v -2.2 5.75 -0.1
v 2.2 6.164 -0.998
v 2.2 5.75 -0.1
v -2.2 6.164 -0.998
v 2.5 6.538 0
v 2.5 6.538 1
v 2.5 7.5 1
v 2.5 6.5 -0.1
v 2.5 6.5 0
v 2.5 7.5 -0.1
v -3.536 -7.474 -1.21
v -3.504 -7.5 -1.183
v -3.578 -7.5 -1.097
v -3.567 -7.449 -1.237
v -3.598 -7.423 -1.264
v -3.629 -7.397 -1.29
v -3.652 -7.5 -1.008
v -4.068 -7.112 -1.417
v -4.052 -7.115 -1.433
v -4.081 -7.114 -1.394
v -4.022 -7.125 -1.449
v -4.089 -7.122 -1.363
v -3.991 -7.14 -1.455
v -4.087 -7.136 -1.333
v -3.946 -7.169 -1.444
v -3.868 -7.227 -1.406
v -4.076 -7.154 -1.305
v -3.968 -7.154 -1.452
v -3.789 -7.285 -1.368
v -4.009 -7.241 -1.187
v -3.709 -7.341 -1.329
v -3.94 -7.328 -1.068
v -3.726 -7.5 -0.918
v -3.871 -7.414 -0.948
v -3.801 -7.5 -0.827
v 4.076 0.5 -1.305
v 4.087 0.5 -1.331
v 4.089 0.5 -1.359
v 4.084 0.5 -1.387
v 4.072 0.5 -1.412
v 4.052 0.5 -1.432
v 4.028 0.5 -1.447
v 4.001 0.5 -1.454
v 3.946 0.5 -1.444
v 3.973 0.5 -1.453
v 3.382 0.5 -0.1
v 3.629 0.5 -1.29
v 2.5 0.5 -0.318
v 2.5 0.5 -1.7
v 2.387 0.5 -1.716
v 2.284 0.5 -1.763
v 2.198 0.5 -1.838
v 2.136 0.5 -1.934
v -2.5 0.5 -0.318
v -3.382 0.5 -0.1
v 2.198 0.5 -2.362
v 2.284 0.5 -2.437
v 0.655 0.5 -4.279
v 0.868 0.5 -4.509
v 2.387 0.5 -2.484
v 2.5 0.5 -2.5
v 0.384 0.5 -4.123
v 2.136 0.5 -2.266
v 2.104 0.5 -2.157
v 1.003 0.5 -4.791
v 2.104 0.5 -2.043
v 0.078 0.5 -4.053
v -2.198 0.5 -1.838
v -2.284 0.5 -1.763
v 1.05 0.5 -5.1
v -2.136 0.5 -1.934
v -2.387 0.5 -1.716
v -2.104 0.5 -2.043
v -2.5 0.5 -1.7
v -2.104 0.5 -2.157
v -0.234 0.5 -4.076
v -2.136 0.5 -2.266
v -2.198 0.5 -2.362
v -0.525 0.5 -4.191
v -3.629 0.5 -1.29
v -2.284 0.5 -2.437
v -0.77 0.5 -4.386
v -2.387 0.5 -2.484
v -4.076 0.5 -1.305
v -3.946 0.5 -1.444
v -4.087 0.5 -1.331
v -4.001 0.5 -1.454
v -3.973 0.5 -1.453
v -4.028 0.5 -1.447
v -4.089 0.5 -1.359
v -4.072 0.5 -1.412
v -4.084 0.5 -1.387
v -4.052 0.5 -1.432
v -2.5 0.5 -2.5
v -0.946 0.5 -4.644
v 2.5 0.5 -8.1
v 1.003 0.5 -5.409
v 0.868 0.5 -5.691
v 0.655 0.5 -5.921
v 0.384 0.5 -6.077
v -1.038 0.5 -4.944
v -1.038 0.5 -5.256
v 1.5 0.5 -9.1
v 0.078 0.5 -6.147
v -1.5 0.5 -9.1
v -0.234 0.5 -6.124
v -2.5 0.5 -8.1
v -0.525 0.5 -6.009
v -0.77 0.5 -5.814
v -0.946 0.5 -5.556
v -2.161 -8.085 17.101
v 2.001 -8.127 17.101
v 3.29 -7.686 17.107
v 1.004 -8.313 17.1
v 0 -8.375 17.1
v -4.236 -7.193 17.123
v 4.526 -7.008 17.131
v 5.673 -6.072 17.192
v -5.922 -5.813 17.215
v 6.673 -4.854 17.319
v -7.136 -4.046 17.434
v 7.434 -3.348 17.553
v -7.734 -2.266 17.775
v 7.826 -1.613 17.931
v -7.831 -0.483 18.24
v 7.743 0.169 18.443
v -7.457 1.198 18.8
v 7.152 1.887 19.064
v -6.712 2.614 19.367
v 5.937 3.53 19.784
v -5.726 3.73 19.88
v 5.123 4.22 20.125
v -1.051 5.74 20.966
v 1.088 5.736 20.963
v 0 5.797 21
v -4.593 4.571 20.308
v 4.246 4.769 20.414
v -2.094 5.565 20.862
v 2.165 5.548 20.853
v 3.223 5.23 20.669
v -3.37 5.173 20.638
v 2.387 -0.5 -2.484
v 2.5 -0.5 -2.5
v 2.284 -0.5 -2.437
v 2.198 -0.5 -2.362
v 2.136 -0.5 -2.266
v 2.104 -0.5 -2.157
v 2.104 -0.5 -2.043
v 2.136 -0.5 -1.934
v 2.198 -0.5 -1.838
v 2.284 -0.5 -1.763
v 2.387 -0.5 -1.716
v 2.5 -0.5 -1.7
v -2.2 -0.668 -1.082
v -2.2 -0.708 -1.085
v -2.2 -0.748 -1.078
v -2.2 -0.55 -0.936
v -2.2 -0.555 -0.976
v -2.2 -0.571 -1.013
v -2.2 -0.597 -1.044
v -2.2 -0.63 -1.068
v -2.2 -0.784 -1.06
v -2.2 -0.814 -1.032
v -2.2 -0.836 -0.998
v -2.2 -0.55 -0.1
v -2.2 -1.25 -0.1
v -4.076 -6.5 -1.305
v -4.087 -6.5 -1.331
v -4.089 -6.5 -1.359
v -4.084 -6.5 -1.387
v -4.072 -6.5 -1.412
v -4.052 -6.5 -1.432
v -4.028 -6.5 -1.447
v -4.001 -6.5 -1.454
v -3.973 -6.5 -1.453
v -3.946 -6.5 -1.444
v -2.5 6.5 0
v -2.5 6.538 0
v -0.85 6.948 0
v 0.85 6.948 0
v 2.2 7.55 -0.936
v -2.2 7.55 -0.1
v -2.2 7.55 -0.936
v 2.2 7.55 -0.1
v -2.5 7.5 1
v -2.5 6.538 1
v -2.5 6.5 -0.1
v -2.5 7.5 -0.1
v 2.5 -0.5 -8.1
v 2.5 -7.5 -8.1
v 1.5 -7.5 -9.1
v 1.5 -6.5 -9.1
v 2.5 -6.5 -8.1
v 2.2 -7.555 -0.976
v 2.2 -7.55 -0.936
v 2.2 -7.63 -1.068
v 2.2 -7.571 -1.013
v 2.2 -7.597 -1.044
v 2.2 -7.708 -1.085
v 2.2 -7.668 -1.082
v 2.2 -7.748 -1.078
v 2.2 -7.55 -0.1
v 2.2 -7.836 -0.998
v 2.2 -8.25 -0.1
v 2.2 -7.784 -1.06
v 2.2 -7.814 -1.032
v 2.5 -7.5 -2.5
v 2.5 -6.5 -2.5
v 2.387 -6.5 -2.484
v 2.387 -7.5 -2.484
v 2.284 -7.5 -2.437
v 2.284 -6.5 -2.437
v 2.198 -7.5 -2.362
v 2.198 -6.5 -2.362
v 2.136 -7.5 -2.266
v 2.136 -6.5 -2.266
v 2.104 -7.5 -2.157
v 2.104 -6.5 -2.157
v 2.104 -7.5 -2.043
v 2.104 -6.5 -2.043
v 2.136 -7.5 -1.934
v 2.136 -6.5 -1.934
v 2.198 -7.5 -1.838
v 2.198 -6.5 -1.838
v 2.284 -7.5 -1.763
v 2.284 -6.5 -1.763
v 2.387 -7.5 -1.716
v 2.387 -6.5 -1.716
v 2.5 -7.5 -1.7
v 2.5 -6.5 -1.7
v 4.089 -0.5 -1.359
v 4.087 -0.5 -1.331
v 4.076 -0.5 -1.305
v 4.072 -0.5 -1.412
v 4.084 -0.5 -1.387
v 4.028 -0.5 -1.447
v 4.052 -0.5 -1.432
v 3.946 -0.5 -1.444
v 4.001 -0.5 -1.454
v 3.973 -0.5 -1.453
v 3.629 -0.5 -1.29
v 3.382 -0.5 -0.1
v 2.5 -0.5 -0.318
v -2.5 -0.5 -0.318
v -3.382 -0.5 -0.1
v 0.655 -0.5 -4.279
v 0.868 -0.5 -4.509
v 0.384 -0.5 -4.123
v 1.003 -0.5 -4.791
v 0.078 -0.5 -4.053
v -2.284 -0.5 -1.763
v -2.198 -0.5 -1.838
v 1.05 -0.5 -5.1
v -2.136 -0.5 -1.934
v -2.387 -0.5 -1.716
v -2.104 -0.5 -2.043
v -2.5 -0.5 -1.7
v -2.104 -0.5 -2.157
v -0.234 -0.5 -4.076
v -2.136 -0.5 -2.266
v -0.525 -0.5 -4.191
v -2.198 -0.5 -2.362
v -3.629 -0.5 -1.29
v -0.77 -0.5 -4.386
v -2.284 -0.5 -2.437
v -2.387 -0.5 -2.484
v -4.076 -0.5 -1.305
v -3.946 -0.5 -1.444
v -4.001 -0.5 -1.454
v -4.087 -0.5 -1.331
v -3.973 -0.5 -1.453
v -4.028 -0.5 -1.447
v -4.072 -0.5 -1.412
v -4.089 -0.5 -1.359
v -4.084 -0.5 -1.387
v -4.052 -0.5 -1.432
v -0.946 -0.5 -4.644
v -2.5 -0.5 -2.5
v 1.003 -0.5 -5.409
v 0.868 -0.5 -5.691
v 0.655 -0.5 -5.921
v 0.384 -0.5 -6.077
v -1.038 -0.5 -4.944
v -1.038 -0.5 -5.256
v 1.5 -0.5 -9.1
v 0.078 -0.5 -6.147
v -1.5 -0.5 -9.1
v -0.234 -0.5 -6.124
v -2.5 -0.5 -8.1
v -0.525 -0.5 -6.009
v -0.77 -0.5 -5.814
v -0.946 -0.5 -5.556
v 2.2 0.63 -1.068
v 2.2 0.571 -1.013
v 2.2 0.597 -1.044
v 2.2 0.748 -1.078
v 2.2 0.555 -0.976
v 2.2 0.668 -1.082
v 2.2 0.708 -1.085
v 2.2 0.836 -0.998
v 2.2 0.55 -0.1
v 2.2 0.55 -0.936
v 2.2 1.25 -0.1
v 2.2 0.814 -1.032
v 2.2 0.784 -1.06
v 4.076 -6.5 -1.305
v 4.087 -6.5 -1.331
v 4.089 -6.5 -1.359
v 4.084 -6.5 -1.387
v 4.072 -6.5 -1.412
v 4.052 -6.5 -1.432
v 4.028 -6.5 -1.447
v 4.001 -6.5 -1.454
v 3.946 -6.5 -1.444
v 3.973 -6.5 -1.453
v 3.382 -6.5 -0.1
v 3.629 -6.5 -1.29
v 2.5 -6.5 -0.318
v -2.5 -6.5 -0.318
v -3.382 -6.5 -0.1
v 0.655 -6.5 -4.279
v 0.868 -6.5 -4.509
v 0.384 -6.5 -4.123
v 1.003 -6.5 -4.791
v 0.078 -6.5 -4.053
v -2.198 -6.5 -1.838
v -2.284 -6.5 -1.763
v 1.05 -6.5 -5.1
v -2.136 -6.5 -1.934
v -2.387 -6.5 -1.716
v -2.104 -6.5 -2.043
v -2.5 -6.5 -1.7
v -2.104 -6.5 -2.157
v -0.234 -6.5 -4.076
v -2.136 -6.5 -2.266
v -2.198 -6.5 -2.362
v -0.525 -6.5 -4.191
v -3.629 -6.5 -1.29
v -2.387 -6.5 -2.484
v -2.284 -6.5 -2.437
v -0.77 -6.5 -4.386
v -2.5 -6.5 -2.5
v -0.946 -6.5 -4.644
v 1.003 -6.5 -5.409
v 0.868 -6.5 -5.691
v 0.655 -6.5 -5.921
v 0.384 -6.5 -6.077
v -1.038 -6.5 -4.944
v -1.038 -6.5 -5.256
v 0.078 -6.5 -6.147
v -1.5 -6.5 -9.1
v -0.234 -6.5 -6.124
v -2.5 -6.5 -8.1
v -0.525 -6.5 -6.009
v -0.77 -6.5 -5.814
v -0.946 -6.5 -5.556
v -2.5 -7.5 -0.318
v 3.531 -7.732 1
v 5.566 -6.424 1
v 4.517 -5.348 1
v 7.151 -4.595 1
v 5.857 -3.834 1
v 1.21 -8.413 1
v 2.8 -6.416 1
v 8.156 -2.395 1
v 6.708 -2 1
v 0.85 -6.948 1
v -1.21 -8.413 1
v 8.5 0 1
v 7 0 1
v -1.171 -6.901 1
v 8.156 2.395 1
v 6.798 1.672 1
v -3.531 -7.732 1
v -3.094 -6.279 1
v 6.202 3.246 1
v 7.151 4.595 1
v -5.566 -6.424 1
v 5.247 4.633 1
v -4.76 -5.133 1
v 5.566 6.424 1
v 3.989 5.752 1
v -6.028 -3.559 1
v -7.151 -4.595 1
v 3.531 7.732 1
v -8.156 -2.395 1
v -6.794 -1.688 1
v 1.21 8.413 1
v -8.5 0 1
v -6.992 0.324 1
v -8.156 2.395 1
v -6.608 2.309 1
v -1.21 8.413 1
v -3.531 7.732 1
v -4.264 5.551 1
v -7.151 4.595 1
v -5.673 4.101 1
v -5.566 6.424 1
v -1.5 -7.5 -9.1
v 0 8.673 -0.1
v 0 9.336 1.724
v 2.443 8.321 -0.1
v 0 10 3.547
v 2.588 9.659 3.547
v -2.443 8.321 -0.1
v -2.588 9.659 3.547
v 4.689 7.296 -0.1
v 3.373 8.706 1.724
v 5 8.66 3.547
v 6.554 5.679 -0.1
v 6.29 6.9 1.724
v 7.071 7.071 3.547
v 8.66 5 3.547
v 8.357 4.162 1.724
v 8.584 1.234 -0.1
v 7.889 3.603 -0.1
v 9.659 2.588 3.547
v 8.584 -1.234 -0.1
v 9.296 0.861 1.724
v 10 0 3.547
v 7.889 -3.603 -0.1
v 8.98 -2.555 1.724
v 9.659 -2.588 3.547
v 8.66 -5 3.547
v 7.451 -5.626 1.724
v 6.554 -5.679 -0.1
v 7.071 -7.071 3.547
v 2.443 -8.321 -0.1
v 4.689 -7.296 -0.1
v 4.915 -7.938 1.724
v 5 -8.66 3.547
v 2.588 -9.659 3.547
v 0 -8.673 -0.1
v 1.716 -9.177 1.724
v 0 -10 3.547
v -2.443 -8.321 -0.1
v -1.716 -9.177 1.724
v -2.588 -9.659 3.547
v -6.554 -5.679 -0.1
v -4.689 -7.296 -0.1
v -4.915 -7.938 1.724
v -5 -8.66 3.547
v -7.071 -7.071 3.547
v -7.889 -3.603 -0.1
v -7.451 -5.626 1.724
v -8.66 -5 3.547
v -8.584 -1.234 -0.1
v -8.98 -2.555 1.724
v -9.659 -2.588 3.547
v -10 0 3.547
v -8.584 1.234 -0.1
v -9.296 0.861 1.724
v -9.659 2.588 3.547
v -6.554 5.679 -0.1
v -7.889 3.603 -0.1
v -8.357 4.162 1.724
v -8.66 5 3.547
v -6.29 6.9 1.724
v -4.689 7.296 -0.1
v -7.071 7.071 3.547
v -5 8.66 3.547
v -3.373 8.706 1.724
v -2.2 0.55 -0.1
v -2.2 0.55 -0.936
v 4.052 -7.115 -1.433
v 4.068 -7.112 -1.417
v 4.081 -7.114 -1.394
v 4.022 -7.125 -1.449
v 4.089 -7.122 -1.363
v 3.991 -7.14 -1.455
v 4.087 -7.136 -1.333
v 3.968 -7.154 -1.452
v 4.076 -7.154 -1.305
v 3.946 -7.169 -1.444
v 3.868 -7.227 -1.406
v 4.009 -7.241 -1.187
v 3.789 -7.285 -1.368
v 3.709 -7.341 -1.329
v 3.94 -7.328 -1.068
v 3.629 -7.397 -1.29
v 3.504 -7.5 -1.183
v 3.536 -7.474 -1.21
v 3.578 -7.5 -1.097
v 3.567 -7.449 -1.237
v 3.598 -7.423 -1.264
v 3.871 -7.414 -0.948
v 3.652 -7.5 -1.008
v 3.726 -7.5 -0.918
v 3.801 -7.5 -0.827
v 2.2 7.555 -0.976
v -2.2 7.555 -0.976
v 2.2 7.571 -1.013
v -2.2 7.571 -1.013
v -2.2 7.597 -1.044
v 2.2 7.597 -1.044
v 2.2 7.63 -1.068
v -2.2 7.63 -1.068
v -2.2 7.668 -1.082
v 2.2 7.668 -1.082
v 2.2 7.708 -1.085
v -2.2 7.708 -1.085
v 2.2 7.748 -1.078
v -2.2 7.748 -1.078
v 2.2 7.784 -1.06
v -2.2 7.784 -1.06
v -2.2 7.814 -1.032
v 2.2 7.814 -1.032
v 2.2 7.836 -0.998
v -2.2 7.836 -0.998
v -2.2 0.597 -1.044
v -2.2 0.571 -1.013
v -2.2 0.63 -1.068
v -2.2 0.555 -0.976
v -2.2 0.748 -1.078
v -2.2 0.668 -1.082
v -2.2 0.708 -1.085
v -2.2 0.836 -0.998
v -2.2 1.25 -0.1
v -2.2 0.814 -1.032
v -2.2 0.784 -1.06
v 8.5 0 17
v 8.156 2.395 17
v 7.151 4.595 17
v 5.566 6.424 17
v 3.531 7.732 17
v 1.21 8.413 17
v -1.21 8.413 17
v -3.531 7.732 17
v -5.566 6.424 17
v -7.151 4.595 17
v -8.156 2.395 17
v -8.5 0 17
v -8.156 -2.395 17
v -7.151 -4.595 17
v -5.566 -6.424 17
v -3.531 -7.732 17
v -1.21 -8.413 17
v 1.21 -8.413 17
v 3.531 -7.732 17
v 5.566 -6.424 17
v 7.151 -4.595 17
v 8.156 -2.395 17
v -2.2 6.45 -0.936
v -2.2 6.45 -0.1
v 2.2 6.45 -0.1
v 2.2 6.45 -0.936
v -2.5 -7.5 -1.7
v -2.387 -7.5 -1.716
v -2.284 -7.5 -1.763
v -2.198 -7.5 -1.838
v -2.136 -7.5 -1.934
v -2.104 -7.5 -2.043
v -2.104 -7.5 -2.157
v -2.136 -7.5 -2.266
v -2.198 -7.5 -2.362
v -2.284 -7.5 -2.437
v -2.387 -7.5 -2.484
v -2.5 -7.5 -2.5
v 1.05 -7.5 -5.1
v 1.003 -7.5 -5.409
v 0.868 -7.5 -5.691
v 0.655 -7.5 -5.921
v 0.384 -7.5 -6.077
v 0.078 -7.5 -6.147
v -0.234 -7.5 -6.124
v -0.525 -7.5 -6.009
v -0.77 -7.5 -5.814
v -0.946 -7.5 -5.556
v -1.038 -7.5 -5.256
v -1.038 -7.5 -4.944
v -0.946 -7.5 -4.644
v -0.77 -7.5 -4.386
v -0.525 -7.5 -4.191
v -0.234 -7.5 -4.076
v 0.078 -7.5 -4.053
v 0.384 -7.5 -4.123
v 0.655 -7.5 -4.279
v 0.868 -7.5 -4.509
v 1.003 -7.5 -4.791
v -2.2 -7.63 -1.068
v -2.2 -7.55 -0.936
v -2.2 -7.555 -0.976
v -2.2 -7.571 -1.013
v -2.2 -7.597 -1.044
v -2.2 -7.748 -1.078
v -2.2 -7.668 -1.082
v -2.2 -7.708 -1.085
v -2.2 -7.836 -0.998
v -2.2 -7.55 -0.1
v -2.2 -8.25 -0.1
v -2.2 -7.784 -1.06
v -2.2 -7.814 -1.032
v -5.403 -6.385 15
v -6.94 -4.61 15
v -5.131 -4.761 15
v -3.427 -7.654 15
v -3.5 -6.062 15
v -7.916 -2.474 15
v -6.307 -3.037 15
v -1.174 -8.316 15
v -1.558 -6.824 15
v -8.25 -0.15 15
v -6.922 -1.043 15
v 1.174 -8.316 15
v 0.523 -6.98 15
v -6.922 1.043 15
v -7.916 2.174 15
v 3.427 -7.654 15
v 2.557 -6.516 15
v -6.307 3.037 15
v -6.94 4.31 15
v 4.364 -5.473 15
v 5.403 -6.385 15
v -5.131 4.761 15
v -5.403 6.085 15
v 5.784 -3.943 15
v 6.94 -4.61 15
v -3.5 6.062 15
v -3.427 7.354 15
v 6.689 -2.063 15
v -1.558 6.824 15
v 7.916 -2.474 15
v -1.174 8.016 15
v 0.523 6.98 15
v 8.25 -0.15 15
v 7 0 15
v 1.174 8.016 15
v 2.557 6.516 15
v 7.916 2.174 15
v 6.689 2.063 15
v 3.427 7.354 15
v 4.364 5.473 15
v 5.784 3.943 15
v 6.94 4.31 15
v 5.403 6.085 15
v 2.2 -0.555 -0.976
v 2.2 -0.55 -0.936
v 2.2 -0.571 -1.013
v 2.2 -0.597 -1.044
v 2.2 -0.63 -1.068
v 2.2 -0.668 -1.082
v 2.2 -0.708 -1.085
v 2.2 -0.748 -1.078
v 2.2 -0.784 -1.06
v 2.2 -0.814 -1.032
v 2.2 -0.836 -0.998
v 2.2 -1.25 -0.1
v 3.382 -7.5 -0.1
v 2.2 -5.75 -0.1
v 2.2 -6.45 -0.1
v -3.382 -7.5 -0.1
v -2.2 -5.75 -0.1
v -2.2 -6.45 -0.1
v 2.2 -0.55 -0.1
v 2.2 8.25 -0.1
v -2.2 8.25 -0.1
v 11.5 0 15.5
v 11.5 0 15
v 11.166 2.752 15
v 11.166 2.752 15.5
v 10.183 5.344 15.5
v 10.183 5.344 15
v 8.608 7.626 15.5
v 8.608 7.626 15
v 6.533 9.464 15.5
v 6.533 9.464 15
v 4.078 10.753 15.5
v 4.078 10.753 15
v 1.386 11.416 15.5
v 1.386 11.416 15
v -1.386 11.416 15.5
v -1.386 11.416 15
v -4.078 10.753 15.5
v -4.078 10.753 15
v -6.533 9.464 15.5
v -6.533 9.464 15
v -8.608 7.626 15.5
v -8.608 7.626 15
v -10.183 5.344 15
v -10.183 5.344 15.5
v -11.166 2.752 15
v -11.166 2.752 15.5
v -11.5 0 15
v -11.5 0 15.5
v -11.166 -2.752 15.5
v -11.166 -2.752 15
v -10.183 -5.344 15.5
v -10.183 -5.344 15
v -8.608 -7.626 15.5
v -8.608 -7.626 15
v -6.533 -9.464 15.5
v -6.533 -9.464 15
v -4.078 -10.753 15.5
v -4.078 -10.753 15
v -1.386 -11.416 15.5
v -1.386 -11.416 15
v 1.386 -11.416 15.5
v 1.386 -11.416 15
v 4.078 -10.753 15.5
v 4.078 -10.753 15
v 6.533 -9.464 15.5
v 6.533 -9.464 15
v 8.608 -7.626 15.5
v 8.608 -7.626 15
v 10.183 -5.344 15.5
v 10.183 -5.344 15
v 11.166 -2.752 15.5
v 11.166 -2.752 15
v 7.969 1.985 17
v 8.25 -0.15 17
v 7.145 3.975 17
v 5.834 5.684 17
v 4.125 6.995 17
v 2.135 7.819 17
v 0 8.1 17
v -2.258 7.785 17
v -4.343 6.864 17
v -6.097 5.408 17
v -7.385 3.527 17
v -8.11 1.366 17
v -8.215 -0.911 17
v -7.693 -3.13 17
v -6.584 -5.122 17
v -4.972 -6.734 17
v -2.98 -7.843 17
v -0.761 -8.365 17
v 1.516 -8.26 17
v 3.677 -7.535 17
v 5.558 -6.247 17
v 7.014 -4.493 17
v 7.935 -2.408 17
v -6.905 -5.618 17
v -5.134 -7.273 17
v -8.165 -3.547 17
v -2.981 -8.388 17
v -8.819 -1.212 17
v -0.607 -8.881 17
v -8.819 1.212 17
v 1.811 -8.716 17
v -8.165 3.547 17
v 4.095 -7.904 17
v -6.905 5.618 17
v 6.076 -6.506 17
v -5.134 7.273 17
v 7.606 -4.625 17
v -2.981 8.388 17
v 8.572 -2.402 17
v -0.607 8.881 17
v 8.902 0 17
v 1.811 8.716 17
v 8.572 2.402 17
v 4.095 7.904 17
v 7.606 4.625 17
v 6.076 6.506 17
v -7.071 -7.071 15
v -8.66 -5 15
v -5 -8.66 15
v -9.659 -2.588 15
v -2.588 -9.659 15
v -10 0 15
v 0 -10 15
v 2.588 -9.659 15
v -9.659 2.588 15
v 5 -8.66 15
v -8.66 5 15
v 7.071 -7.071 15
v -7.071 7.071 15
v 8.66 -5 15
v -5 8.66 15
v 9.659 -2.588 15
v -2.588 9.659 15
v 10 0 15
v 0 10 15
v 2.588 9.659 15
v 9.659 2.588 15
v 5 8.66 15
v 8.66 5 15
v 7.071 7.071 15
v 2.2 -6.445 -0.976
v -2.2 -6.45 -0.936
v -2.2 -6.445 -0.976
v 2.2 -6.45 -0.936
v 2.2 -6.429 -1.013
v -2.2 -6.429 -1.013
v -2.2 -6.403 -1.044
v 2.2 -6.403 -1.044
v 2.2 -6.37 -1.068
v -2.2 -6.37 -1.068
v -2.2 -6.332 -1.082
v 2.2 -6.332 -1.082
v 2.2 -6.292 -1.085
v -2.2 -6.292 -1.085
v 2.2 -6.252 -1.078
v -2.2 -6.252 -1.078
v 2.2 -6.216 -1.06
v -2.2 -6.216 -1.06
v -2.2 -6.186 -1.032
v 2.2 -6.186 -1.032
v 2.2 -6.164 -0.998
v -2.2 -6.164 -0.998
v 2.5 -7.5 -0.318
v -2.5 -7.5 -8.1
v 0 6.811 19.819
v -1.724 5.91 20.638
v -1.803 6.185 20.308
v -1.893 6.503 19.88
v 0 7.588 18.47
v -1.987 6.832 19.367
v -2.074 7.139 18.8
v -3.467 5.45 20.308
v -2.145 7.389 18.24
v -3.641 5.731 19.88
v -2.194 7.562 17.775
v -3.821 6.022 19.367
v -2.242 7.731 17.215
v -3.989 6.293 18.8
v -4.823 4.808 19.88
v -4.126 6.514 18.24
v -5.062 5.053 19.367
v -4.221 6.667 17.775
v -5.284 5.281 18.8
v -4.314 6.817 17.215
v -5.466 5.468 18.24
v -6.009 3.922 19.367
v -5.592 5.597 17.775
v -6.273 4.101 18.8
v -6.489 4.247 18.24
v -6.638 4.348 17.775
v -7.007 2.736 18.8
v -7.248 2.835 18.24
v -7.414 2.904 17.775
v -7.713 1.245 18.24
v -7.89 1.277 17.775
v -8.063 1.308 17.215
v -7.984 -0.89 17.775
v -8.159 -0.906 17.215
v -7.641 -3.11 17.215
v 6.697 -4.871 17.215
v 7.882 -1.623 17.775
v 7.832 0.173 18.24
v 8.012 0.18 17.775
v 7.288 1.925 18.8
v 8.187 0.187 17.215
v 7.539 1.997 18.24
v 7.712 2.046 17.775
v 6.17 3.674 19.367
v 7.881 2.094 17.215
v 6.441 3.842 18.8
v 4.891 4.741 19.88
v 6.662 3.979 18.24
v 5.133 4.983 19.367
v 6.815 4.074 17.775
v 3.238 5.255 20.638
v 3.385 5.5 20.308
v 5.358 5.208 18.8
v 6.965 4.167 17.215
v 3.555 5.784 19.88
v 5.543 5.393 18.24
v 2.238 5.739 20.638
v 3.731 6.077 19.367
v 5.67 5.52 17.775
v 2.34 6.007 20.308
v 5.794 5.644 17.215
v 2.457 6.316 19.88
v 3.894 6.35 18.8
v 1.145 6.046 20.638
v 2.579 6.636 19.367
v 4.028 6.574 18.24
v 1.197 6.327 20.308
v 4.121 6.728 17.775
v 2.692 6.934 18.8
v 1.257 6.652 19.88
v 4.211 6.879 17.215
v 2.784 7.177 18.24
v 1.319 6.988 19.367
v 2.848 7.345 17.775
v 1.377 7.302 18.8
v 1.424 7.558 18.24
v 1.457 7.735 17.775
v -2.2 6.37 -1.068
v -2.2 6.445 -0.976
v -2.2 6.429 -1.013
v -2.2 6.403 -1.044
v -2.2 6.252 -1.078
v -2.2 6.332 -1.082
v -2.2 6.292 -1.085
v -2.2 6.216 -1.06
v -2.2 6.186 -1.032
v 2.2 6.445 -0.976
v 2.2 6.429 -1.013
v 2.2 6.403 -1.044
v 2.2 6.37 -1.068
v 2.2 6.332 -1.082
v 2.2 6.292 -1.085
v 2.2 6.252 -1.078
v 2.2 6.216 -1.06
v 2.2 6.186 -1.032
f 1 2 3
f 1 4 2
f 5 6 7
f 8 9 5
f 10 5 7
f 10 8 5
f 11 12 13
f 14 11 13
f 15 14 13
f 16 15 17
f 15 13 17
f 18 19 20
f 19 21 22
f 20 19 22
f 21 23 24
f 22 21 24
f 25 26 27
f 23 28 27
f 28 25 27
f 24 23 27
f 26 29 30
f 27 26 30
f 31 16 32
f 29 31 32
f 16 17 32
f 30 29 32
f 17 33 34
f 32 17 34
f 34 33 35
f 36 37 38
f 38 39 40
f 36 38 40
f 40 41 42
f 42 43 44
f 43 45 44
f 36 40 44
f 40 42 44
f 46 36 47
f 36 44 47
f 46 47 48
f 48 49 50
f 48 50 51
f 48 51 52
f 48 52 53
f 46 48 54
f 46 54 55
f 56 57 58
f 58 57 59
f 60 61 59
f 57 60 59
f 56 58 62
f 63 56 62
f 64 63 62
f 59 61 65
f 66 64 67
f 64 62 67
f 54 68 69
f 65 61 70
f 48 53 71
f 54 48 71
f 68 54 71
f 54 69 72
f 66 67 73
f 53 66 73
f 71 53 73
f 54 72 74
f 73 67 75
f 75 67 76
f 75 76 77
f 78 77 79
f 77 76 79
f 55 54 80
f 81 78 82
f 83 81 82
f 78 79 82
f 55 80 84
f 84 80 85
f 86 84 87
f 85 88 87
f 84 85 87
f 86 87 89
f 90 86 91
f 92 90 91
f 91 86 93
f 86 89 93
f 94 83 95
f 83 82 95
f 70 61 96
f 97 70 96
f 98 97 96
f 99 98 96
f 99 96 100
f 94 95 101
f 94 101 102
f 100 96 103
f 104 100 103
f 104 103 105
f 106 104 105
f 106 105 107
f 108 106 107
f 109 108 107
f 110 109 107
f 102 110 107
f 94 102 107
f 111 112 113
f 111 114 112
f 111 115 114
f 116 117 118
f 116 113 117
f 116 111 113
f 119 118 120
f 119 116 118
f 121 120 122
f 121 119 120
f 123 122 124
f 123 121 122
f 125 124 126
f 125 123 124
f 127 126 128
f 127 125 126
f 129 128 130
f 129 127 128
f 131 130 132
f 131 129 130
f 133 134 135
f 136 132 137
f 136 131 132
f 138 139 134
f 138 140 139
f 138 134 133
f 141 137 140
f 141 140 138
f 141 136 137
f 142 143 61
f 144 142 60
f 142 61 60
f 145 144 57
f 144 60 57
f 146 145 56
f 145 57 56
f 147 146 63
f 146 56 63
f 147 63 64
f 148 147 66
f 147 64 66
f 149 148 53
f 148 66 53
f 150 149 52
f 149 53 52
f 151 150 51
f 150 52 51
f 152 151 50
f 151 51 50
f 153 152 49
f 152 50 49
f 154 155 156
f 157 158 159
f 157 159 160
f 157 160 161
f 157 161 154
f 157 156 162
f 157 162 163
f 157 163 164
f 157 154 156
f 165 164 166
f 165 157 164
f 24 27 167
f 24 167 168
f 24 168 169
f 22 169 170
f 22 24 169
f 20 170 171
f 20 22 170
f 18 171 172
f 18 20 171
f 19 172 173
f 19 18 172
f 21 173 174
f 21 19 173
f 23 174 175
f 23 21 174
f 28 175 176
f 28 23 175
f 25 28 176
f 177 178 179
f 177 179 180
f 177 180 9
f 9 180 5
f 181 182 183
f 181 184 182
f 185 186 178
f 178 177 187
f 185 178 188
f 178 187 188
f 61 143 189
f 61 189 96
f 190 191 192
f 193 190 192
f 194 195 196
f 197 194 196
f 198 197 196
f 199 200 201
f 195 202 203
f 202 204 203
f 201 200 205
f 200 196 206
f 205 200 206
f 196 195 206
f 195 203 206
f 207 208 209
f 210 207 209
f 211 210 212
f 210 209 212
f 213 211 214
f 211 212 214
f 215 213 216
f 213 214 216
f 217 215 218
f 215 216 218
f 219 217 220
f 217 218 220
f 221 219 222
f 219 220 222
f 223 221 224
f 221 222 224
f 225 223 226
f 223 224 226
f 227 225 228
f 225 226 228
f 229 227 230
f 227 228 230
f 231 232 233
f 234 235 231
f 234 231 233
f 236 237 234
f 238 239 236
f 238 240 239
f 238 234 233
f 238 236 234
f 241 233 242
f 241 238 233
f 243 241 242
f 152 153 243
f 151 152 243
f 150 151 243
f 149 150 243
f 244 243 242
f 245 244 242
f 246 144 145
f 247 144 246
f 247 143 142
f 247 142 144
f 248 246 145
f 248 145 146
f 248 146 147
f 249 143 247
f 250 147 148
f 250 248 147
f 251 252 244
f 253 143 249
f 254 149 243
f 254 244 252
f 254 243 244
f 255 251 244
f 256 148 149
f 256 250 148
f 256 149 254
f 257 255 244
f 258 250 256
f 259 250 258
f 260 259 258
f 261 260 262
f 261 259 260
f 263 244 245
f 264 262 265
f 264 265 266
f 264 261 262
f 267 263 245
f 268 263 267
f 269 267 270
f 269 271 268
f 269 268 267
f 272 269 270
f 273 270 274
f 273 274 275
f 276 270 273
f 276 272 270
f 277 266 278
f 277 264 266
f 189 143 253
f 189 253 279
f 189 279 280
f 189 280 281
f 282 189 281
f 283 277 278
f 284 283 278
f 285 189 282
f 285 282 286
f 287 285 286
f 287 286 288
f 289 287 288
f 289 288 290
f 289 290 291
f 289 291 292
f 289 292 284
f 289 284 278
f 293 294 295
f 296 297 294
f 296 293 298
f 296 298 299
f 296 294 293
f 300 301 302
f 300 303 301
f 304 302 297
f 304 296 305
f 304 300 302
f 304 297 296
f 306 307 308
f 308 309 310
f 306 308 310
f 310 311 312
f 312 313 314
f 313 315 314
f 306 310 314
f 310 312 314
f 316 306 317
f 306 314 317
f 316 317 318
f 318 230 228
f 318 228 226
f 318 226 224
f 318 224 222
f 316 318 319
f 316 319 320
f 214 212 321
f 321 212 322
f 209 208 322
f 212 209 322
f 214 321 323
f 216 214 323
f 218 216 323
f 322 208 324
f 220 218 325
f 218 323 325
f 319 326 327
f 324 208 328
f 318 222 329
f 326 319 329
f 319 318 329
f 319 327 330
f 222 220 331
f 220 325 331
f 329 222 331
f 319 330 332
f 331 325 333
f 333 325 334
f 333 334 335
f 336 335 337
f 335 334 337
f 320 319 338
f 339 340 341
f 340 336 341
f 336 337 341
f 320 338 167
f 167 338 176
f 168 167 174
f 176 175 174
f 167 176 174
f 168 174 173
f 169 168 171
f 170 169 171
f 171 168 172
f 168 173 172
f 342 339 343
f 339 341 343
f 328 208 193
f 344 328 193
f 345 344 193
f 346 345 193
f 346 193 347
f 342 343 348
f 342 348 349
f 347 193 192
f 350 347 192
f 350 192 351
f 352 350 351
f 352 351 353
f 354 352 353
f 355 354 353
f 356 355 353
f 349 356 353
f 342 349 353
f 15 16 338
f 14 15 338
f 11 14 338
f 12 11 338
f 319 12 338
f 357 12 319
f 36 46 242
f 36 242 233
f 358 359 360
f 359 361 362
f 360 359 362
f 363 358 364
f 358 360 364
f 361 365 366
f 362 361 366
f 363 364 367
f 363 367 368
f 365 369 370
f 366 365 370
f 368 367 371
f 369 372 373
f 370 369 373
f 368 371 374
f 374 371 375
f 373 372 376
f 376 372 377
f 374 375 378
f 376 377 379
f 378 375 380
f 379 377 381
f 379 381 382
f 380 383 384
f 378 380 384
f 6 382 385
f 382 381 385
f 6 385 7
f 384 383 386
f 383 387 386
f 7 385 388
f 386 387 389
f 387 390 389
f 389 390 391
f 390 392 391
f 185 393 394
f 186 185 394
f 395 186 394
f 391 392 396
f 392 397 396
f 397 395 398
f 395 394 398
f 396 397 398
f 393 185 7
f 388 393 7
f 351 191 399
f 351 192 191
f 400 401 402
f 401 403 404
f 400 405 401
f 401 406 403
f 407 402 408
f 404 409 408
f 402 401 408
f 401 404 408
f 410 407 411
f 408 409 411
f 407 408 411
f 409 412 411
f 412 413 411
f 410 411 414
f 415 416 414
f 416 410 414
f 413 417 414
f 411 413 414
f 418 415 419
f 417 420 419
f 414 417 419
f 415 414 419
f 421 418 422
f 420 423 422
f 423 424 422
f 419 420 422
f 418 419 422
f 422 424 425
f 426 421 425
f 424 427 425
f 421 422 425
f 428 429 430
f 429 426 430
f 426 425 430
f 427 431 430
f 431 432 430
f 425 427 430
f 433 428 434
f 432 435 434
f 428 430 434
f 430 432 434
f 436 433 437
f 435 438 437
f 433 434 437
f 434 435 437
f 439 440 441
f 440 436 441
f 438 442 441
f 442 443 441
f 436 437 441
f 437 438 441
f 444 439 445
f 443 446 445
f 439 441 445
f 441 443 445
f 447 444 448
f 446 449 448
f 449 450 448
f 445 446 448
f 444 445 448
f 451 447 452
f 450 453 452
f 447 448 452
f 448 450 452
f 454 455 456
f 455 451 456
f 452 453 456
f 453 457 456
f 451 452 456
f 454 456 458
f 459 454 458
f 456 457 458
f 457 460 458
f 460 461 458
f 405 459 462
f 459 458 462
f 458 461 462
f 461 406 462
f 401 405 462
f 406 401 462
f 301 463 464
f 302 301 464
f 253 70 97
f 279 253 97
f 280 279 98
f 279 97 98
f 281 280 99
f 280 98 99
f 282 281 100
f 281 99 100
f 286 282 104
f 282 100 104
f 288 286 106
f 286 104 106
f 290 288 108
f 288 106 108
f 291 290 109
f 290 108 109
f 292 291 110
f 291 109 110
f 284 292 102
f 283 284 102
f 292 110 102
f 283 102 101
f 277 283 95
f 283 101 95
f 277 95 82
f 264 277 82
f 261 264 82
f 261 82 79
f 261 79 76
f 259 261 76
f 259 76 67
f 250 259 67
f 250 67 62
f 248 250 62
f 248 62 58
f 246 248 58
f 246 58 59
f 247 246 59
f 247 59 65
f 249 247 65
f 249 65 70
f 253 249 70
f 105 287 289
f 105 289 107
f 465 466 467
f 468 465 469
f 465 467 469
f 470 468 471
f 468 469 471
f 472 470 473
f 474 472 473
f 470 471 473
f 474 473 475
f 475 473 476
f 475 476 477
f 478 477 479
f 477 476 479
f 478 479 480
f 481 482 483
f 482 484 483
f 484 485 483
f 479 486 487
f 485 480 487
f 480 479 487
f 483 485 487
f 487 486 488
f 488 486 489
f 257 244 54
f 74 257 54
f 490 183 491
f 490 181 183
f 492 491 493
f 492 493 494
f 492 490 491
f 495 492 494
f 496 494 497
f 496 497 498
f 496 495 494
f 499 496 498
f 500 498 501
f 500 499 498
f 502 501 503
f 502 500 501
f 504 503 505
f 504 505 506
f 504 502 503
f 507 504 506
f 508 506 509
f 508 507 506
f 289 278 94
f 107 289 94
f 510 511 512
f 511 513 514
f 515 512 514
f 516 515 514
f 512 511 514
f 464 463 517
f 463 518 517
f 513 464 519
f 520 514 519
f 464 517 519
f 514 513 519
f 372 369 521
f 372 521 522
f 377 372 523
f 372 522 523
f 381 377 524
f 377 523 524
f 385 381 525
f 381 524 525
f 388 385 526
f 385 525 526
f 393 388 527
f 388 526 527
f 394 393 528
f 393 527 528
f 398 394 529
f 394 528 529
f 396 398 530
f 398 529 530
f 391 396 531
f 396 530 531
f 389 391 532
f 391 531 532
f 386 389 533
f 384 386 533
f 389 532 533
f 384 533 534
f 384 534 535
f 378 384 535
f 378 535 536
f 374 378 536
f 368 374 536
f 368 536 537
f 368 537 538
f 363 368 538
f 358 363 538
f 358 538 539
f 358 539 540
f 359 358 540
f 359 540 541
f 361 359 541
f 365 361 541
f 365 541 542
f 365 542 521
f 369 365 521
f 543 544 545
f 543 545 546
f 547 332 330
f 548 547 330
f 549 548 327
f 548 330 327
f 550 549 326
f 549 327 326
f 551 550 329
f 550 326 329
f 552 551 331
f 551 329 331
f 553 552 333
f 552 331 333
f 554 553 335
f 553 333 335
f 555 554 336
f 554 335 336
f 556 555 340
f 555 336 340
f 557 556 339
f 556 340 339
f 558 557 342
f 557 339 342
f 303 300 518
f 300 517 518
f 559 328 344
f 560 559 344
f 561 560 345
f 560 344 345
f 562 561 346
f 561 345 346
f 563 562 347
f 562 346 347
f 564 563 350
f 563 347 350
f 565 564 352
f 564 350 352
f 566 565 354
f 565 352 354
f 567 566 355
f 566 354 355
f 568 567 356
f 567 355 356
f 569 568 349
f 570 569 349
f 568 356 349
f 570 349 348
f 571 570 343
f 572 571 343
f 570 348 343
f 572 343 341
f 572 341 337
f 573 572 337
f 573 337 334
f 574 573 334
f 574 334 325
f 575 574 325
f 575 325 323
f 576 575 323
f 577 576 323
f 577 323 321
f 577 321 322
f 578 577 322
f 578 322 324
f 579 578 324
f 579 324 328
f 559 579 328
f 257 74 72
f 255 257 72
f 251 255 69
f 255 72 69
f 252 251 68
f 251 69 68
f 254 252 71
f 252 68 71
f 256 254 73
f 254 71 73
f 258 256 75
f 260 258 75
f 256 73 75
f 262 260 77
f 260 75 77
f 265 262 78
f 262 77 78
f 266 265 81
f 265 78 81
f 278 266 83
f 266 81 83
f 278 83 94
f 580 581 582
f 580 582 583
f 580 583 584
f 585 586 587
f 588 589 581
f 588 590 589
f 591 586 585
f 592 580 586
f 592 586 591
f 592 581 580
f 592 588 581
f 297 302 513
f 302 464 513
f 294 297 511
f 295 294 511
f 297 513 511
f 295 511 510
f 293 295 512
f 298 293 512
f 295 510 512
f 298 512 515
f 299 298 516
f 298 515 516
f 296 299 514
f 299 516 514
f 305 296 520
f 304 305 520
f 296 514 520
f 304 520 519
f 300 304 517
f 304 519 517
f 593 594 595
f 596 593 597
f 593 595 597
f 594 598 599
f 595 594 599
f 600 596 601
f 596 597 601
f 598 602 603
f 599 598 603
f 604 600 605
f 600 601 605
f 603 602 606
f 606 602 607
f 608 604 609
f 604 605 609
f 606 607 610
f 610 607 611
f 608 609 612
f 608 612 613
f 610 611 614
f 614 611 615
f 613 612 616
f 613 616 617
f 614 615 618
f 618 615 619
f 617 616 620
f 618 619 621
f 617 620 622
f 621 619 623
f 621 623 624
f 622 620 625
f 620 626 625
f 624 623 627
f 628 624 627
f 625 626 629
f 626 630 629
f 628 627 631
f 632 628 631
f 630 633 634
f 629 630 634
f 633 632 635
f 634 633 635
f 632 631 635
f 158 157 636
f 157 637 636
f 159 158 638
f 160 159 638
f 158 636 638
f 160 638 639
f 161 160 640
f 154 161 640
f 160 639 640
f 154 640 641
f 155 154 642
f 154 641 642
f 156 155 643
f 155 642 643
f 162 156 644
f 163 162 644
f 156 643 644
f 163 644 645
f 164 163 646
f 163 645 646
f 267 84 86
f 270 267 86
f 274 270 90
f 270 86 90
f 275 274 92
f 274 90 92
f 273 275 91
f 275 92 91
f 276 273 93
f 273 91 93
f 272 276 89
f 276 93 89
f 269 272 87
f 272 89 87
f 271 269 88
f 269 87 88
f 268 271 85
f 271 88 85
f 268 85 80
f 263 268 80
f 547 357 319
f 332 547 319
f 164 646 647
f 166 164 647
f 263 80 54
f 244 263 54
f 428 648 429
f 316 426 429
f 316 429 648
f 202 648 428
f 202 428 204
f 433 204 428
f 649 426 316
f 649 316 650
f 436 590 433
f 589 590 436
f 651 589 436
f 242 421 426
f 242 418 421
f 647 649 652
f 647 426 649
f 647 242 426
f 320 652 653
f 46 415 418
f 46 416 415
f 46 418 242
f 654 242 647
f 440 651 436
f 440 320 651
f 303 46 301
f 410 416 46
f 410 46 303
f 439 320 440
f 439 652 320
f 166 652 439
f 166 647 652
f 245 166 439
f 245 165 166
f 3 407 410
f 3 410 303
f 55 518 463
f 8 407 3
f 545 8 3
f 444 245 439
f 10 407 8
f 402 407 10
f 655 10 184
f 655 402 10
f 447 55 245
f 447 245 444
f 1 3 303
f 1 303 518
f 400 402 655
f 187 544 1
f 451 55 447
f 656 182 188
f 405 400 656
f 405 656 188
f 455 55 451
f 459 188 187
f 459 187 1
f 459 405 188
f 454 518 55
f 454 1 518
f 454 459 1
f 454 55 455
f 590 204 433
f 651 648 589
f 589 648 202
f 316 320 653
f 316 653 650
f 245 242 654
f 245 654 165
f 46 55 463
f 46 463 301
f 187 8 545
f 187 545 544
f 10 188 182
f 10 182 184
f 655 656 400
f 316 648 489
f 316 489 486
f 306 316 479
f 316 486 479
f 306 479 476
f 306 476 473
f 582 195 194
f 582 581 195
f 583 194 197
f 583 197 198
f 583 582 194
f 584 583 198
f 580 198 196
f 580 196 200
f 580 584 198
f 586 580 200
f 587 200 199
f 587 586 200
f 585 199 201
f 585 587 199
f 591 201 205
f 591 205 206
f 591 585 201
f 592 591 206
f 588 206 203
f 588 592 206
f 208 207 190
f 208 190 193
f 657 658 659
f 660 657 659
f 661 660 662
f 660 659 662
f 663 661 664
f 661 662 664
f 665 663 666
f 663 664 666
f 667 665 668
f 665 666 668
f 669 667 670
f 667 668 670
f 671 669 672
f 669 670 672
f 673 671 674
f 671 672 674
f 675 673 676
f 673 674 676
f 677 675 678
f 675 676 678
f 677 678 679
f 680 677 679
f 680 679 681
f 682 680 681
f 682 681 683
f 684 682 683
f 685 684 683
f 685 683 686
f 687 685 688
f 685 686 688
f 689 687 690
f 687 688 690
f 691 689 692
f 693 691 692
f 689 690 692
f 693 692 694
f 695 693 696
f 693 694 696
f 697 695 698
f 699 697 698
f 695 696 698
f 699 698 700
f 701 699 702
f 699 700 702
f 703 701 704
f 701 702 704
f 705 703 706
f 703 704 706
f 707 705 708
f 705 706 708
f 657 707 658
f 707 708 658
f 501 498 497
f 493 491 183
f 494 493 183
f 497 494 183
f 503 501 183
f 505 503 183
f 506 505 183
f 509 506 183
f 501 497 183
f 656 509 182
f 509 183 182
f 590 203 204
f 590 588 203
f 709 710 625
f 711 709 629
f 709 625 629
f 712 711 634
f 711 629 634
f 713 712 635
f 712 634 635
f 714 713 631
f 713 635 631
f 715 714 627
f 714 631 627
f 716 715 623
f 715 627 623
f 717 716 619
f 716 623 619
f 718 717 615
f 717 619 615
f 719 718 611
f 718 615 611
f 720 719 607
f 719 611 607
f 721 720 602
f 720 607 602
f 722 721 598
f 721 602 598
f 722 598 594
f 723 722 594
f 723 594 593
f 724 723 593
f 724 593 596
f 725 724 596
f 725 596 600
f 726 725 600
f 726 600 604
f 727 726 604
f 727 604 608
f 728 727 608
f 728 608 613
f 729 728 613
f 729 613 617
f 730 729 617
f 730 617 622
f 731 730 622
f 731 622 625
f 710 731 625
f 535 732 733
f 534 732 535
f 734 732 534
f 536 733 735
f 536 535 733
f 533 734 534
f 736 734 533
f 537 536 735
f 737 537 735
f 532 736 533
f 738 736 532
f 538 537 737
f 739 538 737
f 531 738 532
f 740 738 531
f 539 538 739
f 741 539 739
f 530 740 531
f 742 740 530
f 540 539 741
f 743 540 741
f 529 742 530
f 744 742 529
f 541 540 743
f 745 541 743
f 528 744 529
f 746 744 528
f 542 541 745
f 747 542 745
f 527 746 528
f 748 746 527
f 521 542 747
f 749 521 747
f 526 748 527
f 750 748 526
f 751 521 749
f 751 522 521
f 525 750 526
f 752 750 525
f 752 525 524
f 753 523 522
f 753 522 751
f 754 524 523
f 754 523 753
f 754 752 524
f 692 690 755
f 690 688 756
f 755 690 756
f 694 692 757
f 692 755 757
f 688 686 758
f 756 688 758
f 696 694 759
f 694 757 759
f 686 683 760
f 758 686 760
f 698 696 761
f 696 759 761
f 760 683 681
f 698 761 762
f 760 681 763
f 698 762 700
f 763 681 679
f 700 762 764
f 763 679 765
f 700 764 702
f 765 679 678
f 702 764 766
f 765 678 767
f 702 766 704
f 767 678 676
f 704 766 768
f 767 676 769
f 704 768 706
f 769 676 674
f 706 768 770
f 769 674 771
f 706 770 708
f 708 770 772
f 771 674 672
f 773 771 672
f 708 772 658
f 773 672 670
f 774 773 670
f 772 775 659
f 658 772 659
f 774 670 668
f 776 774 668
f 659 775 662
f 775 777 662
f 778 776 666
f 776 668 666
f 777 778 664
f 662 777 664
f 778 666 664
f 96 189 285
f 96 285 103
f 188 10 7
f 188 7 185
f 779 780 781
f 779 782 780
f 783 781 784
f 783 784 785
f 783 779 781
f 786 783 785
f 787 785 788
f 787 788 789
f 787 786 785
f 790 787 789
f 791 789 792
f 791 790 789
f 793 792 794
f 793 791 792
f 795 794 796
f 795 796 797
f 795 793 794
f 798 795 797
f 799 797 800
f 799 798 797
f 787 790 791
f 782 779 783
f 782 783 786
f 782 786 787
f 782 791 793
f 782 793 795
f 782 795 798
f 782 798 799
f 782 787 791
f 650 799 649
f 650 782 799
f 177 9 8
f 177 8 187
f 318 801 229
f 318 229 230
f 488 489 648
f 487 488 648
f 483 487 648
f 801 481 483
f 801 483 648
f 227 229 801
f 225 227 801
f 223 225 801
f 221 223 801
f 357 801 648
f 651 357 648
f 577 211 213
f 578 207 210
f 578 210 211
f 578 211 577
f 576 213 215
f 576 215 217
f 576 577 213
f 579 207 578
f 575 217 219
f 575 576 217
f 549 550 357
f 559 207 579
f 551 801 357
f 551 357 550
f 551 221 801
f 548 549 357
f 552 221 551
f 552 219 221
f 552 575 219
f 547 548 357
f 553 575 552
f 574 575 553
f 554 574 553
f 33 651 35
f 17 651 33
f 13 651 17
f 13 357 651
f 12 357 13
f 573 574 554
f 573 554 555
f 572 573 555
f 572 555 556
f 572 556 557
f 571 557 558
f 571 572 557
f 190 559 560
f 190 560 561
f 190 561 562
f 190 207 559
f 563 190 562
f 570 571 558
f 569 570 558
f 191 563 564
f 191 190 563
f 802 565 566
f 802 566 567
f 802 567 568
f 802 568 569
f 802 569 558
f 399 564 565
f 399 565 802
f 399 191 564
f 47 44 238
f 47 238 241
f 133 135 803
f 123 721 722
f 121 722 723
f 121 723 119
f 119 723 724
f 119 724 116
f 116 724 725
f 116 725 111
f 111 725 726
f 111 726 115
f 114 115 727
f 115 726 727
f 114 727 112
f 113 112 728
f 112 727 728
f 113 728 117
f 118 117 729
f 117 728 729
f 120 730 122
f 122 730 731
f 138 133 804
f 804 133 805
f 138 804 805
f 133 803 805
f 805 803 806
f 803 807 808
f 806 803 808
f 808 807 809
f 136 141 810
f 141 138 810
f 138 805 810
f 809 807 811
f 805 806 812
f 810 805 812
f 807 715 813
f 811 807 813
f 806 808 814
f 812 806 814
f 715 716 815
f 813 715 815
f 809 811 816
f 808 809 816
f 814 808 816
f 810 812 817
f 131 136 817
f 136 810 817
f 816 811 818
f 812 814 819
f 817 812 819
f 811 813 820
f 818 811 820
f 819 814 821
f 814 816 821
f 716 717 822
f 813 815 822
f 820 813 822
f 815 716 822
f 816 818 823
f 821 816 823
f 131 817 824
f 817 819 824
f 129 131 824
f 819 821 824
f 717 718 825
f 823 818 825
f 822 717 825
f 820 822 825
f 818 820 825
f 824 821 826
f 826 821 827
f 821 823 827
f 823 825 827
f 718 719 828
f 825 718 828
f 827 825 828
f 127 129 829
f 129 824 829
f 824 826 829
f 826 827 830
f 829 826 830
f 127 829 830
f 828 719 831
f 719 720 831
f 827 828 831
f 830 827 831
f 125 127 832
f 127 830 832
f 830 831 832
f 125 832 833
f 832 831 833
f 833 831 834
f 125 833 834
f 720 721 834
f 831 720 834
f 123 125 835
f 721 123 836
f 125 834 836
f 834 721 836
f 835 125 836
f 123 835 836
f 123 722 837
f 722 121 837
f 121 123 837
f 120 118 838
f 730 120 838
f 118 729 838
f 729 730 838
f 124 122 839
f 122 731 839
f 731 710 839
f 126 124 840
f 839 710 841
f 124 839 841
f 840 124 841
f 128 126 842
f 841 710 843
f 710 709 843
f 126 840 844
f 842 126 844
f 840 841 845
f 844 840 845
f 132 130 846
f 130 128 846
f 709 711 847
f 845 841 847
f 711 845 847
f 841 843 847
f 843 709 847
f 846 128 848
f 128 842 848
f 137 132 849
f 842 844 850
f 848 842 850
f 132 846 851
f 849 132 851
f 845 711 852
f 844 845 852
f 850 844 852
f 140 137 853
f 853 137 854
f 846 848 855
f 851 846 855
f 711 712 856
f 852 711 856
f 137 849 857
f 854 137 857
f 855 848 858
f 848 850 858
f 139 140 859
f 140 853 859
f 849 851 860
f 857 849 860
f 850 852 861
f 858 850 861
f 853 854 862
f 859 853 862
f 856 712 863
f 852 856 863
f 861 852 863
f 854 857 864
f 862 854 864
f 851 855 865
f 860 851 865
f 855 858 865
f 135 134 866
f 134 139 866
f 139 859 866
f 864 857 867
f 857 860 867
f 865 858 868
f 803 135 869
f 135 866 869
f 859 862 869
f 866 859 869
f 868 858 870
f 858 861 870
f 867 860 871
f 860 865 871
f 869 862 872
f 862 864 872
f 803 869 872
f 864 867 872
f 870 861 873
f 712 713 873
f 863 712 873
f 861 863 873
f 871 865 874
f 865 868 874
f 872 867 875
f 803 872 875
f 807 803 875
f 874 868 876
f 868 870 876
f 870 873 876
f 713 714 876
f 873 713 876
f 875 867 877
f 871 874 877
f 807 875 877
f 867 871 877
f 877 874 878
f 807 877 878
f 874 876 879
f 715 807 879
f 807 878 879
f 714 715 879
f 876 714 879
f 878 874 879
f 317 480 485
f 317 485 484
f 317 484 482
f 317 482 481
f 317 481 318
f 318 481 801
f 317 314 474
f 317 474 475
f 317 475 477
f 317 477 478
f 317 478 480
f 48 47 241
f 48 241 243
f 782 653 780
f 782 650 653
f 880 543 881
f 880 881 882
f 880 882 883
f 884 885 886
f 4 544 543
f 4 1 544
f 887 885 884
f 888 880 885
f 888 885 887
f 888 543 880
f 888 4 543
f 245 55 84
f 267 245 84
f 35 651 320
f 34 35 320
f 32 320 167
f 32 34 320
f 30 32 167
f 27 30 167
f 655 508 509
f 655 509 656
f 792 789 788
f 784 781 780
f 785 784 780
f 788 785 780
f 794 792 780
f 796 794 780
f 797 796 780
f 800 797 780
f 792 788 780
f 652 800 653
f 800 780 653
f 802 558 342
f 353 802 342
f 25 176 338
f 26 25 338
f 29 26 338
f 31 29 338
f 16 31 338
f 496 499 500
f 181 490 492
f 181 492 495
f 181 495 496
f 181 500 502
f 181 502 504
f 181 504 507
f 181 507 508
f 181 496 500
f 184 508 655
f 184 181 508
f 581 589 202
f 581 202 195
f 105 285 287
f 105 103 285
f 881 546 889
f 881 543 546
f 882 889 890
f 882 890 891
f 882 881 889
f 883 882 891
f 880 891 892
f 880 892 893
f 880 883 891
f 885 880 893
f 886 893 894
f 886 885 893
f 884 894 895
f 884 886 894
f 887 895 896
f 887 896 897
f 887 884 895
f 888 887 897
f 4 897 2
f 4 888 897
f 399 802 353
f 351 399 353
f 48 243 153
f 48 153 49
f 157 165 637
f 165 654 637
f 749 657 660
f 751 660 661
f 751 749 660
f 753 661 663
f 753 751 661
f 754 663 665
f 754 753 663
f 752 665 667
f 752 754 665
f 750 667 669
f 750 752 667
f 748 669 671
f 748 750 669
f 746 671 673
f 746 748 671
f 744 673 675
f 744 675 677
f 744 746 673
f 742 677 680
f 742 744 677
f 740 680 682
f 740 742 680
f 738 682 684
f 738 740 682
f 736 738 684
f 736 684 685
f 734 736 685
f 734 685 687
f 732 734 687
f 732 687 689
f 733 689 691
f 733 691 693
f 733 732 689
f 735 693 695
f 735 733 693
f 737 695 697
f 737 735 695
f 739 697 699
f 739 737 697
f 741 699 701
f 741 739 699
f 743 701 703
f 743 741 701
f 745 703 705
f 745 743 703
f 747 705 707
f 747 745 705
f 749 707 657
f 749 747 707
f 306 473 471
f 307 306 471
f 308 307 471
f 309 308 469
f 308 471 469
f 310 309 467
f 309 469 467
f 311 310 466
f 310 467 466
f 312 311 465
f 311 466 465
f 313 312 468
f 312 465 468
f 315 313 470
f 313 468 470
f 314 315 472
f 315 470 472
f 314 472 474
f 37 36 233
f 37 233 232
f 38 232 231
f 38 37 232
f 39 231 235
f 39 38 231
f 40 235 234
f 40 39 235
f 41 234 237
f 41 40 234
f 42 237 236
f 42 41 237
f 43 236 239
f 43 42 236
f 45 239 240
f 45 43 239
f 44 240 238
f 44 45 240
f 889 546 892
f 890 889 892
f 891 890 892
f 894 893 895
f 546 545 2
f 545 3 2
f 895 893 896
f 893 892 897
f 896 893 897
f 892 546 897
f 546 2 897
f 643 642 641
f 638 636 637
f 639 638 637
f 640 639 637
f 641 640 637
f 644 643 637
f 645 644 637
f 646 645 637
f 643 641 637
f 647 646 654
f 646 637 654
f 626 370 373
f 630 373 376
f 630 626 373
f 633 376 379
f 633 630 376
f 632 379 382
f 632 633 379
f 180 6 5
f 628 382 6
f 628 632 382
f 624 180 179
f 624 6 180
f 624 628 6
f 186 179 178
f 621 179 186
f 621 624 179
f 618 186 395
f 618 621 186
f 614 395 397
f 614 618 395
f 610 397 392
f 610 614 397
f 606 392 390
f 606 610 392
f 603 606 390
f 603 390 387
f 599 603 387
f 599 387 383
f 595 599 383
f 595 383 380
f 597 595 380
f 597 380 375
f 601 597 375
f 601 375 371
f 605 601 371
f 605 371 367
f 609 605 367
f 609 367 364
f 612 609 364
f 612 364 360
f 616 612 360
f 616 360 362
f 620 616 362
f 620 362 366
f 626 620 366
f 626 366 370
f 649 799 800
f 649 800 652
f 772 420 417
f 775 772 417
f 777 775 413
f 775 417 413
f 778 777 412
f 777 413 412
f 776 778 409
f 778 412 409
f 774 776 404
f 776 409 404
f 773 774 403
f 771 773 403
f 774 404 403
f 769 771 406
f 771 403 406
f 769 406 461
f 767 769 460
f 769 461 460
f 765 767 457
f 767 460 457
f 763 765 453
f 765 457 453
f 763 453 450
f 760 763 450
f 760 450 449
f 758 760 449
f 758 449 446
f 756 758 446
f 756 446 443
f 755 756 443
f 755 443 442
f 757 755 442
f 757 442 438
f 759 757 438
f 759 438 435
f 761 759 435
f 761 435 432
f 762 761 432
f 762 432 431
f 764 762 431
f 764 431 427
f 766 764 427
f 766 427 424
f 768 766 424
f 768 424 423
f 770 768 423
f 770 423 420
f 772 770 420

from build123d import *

# Parameters (mm, degrees)
SKETCH1_R                = 10
BOSS_EXTRUDE1_DEPTH      = 15
SKETCH2_R                = 11.5
BOSS_EXTRUDE2_DEPTH      = 2
SKETCH3_R                = 8.5
CUT_EXTRUDE1_DEPTH       = 2
CUT_EXTRUDE2_REACH       = 17
SKETCH4_R                = 8.5
SKETCH4_R_2              = 7
SKETCH5_R                = 10
SKETCH5_W                = 5
SKETCH5_H                = 1
BOSS_EXTRUDE3_DEPTH      = 0.1
BOSS_EXTRUDE3_DEPTH_BACK = 1
SKETCH6_W                = 5
SKETCH6_H                = 1
BOSS_EXTRUDE4_DEPTH      = 9
SKETCH7_R                = 8.25
BOSS_EXTRUDE5_DEPTH      = 6
CUT_EXTRUDE3_DEPTH       = 16
CUT_EXTRUDE3_DEPTH_BACK  = 16
SKETCH10_R               = 1.05
SKETCH10_R_2             = 0.4
CUT_EXTRUDE4_DEPTH       = 13
CHAMFER1_SIZE            = 1
CHAMFER2_SIZE            = 1
BOSS_EXTRUDE8_DEPTH      = 1
BOSS_EXTRUDE9_DEPTH      = 2.2
CHAMFER4_SIZE            = 1.5
CHAMFER4_SIZE2           = 2.598076211


with BuildPart() as part:
    # Sketch1 → Boss-Extrude1 (new body)
    with BuildSketch(Plane.XY):
        Circle(SKETCH1_R)
    extrude(amount=BOSS_EXTRUDE1_DEPTH)

    # Sketch2 → Boss-Extrude2 (add)
    with BuildSketch(Plane.XY.offset(15)):
        Circle(SKETCH2_R)
    extrude(amount=BOSS_EXTRUDE2_DEPTH)

    # Sketch3 → Cut-Extrude1 (cut)
    with BuildSketch(Plane.XY.offset(17)):
        Circle(SKETCH3_R)
    extrude(amount=-CUT_EXTRUDE1_DEPTH, mode=Mode.SUBTRACT)

    # Sketch4 → Cut-Extrude2 (cut, up to next)
    with BuildSketch(Plane.XY.offset(15), mode=Mode.PRIVATE) as cut_extrude2_sk1:
        Circle(SKETCH4_R)
        Circle(SKETCH4_R_2, mode=Mode.SUBTRACT)
    cut_extrude2_tool1 = extrude(cut_extrude2_sk1.sketch, amount=-CUT_EXTRUDE2_REACH, mode=Mode.PRIVATE) & part.part
    add(cut_extrude2_tool1.solids().sort_by_distance((-8.259584, 0, 15))[0], mode=Mode.SUBTRACT)

    # Sketch5 → Boss-Extrude3 (add, two sides)
    with BuildSketch(Plane(origin=(0, 0, 0), x_dir=(-1, 0, 0), z_dir=(0, 0, -1))) as boss_extrude3_sk:
        Circle(SKETCH5_R)
        with Locations((0, 7)):
            Rectangle(SKETCH5_W, SKETCH5_H, mode=Mode.SUBTRACT)
    extrude(amount=BOSS_EXTRUDE3_DEPTH)
    extrude(boss_extrude3_sk.sketch, amount=-BOSS_EXTRUDE3_DEPTH_BACK)

    # Sketch6 → Boss-Extrude4 (add)
    with BuildSketch(Plane(origin=(0, 0, -0.1), x_dir=(-1, 0, 0), z_dir=(0, 0, -1))):
        with Locations((0, -7)):
            Rectangle(SKETCH6_W, SKETCH6_H)
        Rectangle(SKETCH6_W, SKETCH6_H)
    extrude(amount=BOSS_EXTRUDE4_DEPTH)

    # Sketch7 → Boss-Extrude5 (add)
    with BuildSketch(Plane.XY.offset(15)):
        with Locations((0, -0.15)):
            Circle(SKETCH7_R)
    extrude(amount=BOSS_EXTRUDE5_DEPTH)

    # Sketch8 → Cut-Revolve1 (revolve, cut)
    with BuildSketch(Plane(origin=(0, 0, 0), x_dir=(0, 0, -1), z_dir=(1, 0, 0))):
        with BuildLine():
            Line((-17, 8.1), (-21.761349269, 8.1))
            Line((-21.761349269, 8.1), (-21.761349269, 5.797413216))
            Line((-21.761349269, 5.797413216), (-21, 5.797413216))
            ThreePointArc((-21, 5.797413216), (-19.162388314, 7.230803795), (-17, 8.1))
        make_face()
    revolve(axis=Axis((0, -0.15, 21), (0, 0, 1)), mode=Mode.SUBTRACT)

    # Sketch9 → Cut-Extrude3 (cut, two sides)
    with BuildSketch(Plane(origin=(0, 0, 0), x_dir=(0, 0, -1), z_dir=(1, 0, 0))) as cut_extrude3_sk:
        with BuildLine():
            Line((-21, 5.797413216), (-21, -8.374651695))
            Line((-21, -8.374651695), (-17.1, -8.374651695))
            ThreePointArc((-17.1, -8.374651695), (-18.085767141, -1.023272716), (-21, 5.797413216))
        make_face()
    extrude(amount=CUT_EXTRUDE3_DEPTH, mode=Mode.SUBTRACT)
    extrude(cut_extrude3_sk.sketch, amount=-CUT_EXTRUDE3_DEPTH_BACK, mode=Mode.SUBTRACT)

    # Sketch10 → Cut-Extrude4 (cut, through all)
    with BuildSketch(Plane(origin=(0, 0.5, 0), x_dir=(1, 0, 0), z_dir=(0, 1, 0))):
        with Locations((0, 5.1)):
            Circle(SKETCH10_R)
        with Locations((-2.5, 2.1)):
            Circle(SKETCH10_R_2)
        with Locations((2.5, 2.1)):
            Circle(SKETCH10_R_2)
    extrude(amount=-CUT_EXTRUDE4_DEPTH, mode=Mode.SUBTRACT)

    # Chamfer1
    chamfer1_edges = [part.edges().sort_by_distance(p)[0] for p in [
        (2.5, 0, -9.1),
        (-2.5, 0, -9.1),
    ]]
    chamfer(chamfer1_edges, length=CHAMFER1_SIZE)

    # Chamfer2
    chamfer2_edges = [part.edges().sort_by_distance(p)[0] for p in [
        (-2.5, -7, -9.1),
        (2.5, -7, -9.1),
    ]]
    chamfer(chamfer2_edges, length=CHAMFER2_SIZE)

    # Sketch11 → Boss-Extrude8 (add)
    with BuildSketch(Plane(origin=(0, 0.5, 0), x_dir=(1, 0, 0), z_dir=(0, 1, 0))):
        with BuildLine():
            Line((-3.629263342, 1.290449142), (-2.5, 0.318466995))
            Line((-2.5, 0.318466995), (-2.5, 0.1))
            Line((-2.5, 0.1), (-3.382092802, 0.1))
            Line((-3.382092802, 0.1), (-4.076192043, 1.304590563))
            ThreePointArc((-4.076192043, 1.304590563), (-4.0626874, 1.422710807), (-3.945800247, 1.444440068))
            Line((-3.945800247, 1.444440068), (-3.629263342, 1.290449142))
        make_face()
        with BuildLine():
            Line((2.5, 0.318466995), (2.5, 0.1))
            Line((2.5, 0.1), (3.382092802, 0.1))
            Line((3.382092802, 0.1), (4.076192043, 1.304590563))
            ThreePointArc((4.076192043, 1.304590563), (4.0626874, 1.422710807), (3.945800247, 1.444440068))
            Line((3.945800247, 1.444440068), (3.629263342, 1.290449142))
            Line((3.629263342, 1.290449142), (2.5, 0.318466995))
        make_face()
    boss_extrude8 = extrude(amount=-BOSS_EXTRUDE8_DEPTH)

    # Sketch12 → Boss-Extrude9 (add, symmetric)
    with BuildSketch(Plane(origin=(0, 0, 0), x_dir=(0, 0, -1), z_dir=(1, 0, 0))):
        with BuildLine():
            Line((0.1, 0.55), (0.935536489, 0.55))
            ThreePointArc((0.935536489, 0.55), (1.08205668, 0.667877829), (0.998290443, 0.836242215))
            Line((0.998290443, 0.836242215), (0.1, 1.25))
            Line((0.1, 1.25), (0.1, 0.55))
        make_face()
        with BuildLine():
            Line((0.1, -1.25), (0.1, -0.55))
            Line((0.1, -0.55), (0.935536489, -0.55))
            ThreePointArc((0.935536489, -0.55), (1.08205668, -0.667877829), (0.998290443, -0.836242215))
            Line((0.998290443, -0.836242215), (0.1, -1.25))
        make_face()
    boss_extrude9 = extrude(amount=BOSS_EXTRUDE9_DEPTH, both=True)

    # Mirror4: Boss-Extrude8, Boss-Extrude9 across plane
    add(boss_extrude8.mirror(Plane.ZX.offset(-3.5)))
    add(boss_extrude9.mirror(Plane.ZX.offset(-3.5)))

    # Mirror5: Boss-Extrude9 across plane
    add(boss_extrude9.mirror(Plane.ZX.offset(3.5)))

    # Sketch13 → Cut-Revolve2 (revolve, cut)
    with BuildSketch(Plane(origin=(0, 0, 0), x_dir=(0, 0, -1), z_dir=(1, 0, 0))):
        Polygon((1.764077397, 8.06685955), (-3.547182339, 10), (0.1, 10), (1.764077397, 10), align=None)
    revolve(axis=Axis((0, 0, 0), (0, 0, -1)), mode=Mode.SUBTRACT)

    # Chamfer4
    chamfer4_edges = [part.edges().sort_by_distance(p)[0] for p in [
        (-11.5, 0, 17),
    ]]
    chamfer4_side = [part.faces().sort_by_distance(p)[0] for p in [
        (-11.5, 0, 16),
    ]]
    chamfer(chamfer4_edges, length=CHAMFER4_SIZE, length2=CHAMFER4_SIZE2, reference=chamfer4_side[0])


solid = part.part
